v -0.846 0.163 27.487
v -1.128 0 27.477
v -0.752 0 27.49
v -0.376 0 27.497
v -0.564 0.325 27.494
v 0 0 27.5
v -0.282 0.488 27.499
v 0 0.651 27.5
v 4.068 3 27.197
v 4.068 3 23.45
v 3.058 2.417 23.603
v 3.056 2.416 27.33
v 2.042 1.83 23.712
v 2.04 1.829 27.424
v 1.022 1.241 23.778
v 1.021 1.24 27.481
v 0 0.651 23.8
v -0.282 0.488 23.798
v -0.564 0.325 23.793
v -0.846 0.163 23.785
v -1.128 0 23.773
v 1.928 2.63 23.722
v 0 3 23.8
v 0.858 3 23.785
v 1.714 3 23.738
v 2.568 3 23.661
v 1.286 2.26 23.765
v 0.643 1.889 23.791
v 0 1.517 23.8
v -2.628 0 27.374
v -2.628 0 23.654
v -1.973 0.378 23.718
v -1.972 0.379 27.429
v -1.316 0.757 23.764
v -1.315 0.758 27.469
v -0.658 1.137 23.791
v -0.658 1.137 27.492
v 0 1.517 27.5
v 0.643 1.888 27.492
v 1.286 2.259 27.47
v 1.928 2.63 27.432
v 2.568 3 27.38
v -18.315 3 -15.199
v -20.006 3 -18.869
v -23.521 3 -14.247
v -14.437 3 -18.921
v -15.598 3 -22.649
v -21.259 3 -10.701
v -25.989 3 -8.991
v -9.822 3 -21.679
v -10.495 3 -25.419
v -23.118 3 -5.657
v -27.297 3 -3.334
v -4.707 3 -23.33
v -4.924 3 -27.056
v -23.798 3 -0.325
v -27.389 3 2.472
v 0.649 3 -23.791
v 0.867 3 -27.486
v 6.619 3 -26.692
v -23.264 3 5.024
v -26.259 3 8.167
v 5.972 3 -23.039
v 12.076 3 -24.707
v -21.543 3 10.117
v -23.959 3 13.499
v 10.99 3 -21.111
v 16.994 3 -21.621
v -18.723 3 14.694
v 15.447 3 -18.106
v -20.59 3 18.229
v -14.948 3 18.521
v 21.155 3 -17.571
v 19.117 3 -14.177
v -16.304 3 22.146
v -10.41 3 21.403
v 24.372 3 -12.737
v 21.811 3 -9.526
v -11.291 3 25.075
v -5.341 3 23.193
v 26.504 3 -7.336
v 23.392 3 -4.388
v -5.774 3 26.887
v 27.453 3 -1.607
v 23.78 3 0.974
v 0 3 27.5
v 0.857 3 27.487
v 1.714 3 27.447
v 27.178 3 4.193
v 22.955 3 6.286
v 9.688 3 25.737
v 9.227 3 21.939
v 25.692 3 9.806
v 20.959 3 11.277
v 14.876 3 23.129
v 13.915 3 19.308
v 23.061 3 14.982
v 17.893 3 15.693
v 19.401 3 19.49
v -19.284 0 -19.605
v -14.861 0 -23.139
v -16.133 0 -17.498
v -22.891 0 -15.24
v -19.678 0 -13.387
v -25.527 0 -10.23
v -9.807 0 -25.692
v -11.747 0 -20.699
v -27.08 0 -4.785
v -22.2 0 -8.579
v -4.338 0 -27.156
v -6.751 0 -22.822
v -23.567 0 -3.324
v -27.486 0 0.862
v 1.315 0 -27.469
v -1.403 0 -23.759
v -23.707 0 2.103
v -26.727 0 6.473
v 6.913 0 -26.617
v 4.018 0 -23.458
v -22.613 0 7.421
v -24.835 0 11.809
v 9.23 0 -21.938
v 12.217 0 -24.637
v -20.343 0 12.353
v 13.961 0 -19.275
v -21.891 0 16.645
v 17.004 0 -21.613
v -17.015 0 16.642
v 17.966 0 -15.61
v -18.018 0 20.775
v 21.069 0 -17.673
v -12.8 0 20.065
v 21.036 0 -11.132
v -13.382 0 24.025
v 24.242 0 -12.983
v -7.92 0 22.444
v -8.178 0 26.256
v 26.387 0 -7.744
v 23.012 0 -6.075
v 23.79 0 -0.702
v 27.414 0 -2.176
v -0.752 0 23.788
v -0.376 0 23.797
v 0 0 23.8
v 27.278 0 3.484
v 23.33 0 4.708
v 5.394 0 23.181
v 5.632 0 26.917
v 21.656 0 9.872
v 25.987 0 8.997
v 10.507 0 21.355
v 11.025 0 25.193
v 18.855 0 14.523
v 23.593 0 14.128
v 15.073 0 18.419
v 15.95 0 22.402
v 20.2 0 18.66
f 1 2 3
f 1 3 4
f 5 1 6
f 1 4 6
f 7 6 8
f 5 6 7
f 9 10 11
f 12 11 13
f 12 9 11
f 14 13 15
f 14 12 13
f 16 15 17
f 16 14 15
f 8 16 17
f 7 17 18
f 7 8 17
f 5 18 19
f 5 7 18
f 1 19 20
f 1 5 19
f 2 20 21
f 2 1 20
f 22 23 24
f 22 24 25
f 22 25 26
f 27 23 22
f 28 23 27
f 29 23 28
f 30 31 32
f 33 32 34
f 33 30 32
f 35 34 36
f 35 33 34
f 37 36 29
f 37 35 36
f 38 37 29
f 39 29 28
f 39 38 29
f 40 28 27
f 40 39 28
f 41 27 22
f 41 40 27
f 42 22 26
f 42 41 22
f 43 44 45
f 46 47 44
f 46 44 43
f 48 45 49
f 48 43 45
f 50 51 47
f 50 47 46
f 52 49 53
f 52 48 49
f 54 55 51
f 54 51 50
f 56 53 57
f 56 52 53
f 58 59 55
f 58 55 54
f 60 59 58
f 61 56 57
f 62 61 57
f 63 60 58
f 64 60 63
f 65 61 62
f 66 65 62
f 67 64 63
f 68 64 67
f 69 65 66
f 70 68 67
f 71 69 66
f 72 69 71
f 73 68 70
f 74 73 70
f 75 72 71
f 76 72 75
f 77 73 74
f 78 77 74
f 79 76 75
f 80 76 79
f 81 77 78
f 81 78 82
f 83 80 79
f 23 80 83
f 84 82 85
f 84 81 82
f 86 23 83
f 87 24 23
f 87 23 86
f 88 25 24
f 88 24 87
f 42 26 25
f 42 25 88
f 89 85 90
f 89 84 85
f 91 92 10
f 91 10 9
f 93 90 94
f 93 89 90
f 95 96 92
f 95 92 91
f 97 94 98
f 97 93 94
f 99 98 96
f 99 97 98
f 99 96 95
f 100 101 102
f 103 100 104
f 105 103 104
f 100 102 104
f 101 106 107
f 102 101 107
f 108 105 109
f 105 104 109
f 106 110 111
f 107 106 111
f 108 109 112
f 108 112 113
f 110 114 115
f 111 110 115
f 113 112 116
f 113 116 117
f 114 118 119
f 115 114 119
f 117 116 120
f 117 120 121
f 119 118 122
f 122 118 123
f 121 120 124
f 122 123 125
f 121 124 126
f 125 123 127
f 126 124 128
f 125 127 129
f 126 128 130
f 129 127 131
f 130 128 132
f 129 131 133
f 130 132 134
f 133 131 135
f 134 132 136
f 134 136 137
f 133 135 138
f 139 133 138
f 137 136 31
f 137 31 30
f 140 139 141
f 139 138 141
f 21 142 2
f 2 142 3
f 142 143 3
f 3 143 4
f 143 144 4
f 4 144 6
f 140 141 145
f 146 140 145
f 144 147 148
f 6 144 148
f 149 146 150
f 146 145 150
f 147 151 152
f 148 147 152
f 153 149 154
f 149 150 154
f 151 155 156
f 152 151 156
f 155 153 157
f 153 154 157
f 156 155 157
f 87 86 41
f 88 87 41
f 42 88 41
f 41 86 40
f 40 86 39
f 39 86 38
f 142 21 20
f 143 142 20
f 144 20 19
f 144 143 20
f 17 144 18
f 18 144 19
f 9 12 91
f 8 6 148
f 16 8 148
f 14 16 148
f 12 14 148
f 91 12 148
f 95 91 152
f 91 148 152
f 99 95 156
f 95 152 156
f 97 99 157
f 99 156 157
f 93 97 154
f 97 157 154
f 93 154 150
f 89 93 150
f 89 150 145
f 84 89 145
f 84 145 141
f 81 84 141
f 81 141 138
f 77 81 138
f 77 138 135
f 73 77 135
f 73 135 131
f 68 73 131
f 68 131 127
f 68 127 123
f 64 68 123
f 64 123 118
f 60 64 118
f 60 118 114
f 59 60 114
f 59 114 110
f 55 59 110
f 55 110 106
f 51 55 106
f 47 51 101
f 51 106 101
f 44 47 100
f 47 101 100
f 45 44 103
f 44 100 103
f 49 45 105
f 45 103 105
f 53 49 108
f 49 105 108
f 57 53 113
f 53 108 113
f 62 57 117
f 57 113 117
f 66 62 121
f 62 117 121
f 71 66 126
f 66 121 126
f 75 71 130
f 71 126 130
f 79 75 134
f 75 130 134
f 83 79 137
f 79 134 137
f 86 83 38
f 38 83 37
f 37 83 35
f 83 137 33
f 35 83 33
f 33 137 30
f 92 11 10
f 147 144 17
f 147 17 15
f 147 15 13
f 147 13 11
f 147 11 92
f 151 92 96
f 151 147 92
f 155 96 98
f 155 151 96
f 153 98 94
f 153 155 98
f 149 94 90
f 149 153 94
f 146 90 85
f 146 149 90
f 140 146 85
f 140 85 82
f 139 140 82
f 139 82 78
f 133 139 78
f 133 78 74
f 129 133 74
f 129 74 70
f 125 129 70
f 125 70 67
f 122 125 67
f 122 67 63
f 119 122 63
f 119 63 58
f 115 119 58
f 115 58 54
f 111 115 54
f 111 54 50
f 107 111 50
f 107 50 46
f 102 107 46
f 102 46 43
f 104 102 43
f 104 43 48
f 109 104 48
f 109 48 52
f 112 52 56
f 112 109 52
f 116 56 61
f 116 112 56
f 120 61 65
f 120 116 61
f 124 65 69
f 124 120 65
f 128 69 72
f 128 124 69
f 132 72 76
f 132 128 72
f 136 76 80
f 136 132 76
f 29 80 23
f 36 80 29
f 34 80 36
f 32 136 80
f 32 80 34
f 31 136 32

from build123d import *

# Parameters (mm, degrees)
SKETCH1_R               = 27.5
SKETCH1_R_2             = 23.8
BOSS_EXTRUDE1_DEPTH     = 3
CUT_EXTRUDE1_REACH      = 63.565
CUT_EXTRUDE1_END_RADIUS = 23.8


with BuildPart() as part:
    # Sketch1 → Boss-Extrude1 (new body)
    with BuildSketch(Plane(origin=(0, 0, 0), x_dir=(1, 0, 0), z_dir=(0, 1, 0))):
        with Locations(Location((0, 0, 0), (0, 0, 270))):
            Circle(SKETCH1_R)
        with Locations(Location((0, 0, 0), (0, 0, 270))):
            Circle(SKETCH1_R_2, mode=Mode.SUBTRACT)
    extrude(amount=BOSS_EXTRUDE1_DEPTH)

    # Cut-Extrude1: up to this cylinder (the profile starts outside it)
    cut_extrude1_end = Plane(origin=(0, 1.5, 0), z_dir=(0, -1, 0)) * Cylinder(CUT_EXTRUDE1_END_RADIUS, 175.73, mode=Mode.PRIVATE)
    # Sketch2 → Cut-Extrude1 (cut, up to the surface)
    with BuildSketch(Plane.XY.offset(27.5), mode=Mode.PRIVATE) as cut_extrude1_sk1:
        Polygon((-2.627763182, 0), (2.56838924, 3), (4.06838924, 3), (-1.127763182, 0), align=None)
    cut_extrude1_tool1 = extrude(cut_extrude1_sk1.sketch, amount=-CUT_EXTRUDE1_REACH, mode=Mode.PRIVATE) - cut_extrude1_end
    add(cut_extrude1_tool1.solids().sort_by_distance((0.720313, 1.5, 27.5))[0], mode=Mode.SUBTRACT)


solid = part.part
